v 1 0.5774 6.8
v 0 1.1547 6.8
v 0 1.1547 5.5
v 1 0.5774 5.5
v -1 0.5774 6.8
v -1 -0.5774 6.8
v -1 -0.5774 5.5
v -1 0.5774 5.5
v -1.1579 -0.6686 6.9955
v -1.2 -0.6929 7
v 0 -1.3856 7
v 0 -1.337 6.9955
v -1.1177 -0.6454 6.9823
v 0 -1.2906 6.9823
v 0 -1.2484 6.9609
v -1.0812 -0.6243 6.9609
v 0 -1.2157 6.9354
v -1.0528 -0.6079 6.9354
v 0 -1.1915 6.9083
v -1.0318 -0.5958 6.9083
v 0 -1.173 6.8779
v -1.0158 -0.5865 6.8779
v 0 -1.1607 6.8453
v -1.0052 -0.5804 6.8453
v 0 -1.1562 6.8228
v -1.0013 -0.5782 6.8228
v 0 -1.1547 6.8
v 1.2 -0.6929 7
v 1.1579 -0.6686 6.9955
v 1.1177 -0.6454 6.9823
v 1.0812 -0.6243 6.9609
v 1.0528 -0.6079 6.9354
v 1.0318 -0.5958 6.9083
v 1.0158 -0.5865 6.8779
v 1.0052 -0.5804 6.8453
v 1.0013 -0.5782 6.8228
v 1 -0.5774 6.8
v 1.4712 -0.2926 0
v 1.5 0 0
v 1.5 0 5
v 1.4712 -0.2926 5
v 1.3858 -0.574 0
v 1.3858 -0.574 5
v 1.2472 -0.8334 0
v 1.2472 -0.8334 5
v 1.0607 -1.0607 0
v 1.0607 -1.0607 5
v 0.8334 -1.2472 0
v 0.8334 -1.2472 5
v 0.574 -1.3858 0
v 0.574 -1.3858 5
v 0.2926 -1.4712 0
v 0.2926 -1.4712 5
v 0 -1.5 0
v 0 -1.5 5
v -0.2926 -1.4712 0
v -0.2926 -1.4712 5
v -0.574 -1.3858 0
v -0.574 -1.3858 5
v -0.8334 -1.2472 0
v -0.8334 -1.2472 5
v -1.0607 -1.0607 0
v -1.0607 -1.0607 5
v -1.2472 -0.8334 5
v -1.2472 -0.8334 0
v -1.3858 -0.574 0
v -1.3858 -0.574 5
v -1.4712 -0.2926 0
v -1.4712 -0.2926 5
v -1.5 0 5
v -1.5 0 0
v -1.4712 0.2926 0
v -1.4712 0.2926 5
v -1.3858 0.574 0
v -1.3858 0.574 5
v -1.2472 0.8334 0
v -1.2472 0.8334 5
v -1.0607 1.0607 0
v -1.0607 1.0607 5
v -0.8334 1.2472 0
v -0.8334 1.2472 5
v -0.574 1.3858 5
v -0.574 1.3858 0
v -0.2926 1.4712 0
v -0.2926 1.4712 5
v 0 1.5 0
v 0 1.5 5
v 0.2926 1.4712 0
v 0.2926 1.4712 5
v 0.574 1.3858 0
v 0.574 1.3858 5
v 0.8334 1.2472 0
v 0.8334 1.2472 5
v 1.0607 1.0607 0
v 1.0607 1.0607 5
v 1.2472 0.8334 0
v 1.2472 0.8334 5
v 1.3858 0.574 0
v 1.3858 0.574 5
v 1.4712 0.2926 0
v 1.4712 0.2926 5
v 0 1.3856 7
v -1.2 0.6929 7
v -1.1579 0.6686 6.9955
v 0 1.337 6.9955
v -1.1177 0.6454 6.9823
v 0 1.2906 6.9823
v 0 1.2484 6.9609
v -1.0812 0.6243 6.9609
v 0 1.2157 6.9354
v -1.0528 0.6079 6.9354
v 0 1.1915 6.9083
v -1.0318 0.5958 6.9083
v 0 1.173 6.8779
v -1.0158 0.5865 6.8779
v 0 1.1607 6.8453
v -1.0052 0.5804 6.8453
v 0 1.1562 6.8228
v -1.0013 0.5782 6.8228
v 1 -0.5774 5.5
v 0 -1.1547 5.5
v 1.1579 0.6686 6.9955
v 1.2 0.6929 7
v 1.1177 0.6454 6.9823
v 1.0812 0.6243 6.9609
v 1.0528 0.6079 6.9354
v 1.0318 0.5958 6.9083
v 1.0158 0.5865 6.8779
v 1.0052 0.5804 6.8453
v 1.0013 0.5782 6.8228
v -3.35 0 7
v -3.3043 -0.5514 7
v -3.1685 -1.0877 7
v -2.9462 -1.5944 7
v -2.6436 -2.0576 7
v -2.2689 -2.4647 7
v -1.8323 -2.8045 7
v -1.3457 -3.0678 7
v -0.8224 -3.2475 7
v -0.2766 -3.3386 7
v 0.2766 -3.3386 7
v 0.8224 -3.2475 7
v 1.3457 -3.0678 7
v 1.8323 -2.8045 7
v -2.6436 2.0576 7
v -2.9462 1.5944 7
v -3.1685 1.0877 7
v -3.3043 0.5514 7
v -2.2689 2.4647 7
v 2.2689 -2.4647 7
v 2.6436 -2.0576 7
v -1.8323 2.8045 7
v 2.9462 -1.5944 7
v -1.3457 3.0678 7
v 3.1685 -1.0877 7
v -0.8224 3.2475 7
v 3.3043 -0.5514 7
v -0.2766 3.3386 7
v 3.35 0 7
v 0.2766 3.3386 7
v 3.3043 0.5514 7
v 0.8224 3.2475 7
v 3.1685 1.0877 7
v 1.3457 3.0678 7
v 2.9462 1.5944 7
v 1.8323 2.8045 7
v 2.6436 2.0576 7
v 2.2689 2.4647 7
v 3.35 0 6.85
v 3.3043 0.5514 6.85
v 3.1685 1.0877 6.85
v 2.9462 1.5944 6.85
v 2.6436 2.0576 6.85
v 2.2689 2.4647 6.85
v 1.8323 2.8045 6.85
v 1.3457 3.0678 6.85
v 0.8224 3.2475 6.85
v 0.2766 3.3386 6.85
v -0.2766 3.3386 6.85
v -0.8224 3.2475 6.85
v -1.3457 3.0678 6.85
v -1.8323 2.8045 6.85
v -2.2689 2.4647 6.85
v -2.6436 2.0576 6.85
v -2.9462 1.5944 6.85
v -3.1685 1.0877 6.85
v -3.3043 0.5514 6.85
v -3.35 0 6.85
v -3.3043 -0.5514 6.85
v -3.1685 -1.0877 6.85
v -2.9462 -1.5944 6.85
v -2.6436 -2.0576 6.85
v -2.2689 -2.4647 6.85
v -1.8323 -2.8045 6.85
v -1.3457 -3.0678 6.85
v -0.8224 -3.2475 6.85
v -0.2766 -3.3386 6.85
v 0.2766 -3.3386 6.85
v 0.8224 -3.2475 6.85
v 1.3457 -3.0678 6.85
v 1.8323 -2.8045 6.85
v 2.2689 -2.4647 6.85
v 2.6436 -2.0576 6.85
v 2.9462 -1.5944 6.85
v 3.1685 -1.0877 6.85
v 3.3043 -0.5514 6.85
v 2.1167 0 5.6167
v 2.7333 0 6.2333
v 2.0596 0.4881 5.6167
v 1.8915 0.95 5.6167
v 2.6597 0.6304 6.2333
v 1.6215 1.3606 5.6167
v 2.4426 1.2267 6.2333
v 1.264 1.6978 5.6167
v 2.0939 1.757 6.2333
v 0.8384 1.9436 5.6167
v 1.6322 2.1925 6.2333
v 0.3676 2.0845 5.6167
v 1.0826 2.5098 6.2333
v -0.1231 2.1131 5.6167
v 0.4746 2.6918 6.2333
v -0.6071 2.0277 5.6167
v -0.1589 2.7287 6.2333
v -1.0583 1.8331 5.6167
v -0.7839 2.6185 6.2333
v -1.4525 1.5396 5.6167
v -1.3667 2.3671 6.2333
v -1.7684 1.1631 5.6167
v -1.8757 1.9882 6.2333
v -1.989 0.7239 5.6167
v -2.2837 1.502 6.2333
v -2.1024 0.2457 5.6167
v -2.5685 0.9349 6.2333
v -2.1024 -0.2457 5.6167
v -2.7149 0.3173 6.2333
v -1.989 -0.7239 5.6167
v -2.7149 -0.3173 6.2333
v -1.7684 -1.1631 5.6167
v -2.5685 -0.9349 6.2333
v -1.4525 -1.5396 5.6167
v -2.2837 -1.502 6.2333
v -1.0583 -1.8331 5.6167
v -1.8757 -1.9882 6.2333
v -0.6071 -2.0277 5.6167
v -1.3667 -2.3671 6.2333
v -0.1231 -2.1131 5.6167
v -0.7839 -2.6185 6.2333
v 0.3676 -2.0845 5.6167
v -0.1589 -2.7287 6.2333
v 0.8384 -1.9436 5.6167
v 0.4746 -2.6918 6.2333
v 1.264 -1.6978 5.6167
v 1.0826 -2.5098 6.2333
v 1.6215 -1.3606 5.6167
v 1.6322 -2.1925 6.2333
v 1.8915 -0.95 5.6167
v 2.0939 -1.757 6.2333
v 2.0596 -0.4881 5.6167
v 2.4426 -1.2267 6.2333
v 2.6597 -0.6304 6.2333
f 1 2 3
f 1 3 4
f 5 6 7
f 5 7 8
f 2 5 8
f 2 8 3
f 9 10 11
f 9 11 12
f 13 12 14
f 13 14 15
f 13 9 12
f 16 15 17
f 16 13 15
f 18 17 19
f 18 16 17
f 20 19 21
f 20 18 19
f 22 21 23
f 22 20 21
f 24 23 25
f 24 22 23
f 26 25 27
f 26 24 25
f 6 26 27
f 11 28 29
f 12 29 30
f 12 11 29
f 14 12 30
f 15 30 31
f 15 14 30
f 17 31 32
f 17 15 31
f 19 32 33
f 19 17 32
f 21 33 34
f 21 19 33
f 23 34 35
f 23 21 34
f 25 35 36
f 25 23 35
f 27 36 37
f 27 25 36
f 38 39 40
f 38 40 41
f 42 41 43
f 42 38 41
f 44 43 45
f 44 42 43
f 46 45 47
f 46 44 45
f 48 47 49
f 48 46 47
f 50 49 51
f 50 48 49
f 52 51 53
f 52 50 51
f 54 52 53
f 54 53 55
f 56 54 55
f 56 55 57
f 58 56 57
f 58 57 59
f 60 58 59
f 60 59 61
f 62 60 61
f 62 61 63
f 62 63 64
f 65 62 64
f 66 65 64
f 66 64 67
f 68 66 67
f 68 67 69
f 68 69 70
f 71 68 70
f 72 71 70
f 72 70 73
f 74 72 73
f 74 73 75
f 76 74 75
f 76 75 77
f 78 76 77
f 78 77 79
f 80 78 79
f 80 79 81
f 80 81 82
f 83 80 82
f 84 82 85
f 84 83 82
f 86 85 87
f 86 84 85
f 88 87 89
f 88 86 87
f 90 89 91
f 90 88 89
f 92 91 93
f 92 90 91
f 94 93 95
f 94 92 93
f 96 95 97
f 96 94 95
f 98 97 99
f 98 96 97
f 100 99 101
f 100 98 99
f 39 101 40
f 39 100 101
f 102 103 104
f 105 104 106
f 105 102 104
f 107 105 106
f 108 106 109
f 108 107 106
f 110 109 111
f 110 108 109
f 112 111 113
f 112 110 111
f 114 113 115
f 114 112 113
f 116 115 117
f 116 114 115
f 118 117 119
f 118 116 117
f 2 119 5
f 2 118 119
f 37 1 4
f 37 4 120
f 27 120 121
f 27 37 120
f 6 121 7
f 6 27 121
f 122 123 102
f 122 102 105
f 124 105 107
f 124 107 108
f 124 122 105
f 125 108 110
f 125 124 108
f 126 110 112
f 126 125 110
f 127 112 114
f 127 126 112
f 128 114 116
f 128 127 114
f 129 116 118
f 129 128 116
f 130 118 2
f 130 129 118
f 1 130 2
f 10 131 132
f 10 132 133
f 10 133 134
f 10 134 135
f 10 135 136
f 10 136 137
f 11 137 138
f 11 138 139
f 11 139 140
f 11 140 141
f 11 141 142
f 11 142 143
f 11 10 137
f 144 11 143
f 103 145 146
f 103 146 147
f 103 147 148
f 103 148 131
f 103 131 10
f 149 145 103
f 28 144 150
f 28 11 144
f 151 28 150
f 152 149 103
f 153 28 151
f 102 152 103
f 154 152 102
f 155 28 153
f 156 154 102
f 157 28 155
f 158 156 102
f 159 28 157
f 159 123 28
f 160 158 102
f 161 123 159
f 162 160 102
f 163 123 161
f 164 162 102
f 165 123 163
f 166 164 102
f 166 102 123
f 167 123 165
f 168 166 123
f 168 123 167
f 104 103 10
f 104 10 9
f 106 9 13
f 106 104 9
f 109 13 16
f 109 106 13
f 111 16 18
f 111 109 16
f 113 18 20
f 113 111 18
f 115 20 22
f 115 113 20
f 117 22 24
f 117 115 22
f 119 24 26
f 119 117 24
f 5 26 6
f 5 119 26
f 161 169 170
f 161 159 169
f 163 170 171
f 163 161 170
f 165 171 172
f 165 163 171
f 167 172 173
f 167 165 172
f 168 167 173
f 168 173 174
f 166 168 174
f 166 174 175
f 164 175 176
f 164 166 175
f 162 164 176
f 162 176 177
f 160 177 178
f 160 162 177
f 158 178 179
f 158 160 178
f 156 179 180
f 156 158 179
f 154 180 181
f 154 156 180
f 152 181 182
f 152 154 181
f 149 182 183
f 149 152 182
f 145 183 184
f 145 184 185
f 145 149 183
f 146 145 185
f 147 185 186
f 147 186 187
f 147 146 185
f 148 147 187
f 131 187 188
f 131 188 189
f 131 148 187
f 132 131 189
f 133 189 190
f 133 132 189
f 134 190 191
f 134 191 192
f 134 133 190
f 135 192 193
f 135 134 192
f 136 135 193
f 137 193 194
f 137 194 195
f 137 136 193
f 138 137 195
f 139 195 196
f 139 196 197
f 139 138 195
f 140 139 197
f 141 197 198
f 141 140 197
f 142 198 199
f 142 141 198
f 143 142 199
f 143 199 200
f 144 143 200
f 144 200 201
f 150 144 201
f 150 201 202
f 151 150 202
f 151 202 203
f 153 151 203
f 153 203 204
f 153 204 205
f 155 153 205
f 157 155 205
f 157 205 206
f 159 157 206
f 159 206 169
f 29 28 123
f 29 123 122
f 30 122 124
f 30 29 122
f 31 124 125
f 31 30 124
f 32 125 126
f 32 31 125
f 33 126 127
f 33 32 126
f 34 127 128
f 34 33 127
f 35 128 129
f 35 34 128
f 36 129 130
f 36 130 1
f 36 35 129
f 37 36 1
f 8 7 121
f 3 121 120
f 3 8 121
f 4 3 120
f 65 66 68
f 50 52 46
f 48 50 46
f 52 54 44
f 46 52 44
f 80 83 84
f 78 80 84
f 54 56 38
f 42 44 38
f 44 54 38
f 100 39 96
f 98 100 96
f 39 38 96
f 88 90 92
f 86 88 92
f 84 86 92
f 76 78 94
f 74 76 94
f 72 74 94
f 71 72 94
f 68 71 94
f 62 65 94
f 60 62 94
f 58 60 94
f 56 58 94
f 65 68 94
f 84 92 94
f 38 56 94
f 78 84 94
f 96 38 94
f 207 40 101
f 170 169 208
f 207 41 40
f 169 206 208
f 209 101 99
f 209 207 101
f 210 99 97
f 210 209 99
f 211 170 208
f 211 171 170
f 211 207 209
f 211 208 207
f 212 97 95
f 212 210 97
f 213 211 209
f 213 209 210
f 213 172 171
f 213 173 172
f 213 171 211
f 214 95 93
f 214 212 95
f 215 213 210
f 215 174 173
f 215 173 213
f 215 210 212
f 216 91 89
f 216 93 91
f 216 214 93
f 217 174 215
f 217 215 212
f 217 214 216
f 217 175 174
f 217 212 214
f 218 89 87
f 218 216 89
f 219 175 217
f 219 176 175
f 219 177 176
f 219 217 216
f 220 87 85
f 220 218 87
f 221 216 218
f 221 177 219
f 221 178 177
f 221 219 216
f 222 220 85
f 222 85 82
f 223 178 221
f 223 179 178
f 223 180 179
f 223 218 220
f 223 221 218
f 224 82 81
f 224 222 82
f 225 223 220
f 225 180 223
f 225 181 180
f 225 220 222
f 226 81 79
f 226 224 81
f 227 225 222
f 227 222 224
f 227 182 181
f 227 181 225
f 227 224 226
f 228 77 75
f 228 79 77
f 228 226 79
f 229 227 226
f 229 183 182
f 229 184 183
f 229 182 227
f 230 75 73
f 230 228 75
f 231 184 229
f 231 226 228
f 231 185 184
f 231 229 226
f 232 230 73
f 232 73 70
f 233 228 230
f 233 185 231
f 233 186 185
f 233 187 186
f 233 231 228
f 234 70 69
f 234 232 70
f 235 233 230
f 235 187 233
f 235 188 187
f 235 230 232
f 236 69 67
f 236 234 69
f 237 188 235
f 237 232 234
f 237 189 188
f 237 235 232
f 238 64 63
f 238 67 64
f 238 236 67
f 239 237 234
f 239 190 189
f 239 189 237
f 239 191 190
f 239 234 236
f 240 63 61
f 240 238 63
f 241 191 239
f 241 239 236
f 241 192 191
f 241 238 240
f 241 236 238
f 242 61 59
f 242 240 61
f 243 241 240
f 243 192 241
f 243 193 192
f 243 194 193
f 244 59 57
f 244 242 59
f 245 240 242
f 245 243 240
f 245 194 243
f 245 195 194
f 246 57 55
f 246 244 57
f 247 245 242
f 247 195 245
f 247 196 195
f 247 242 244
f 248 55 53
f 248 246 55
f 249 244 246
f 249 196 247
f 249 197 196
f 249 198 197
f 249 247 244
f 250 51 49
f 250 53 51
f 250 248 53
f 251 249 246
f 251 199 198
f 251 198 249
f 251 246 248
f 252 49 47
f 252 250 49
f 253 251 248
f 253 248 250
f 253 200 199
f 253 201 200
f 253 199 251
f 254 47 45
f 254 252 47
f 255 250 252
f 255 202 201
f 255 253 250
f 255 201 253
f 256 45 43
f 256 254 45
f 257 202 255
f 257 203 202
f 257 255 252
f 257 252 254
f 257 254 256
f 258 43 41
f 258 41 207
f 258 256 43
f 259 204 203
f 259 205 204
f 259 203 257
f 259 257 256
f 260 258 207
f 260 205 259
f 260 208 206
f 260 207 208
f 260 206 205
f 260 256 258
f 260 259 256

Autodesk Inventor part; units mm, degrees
ref_plane "YZ Plane" through (0, 0, 0) normal (1, 0, 0) x (0, 1, 0)
ref_plane "XZ Plane" through (0, 0, 0) normal (0, 1, 0) x (-1, 0, 0)
ref_plane "XY Plane" through (0, 0, 0) normal (0, 0, 1) x (1, 0, 0)
sketch "Sketch1" plane through (0, 0, 0) normal (0, 0, 1) x (1, 0, 0)
  circle A0 centre (0, 0) radius 1.5
  dimension "d0" = 3
extrude "Extrusion1" add sketch "Sketch1" along normal blind 5
sketch "Sketch2" plane through (0, 0, 5) normal (0, 0, 1) x (1, 0, 0)
  circle A0 centre (0, 0) radius 1.5 projected
extrude "Extrusion2" add sketch "Sketch2" along normal blind 2 draft 45
sketch "Sketch3" plane through (0, 0, 7) normal (0, 0, 1) x (1, 0, 0)
  circle A0 centre (0, 0) radius 3.5 projected
  circle A1 centre (0, 0) radius 3.35
  dimension "d5" = 6.7
extrude "Extrusion3" cut sketch "Sketch3" against normal blind 2
thread "Thread1" size "M3x0.5" class "6g" standard "ANSI Metric M Profile" full length
sketch "Sketch4" plane through (0, 0, 7) normal (0, 0, 1) x (1, 0, 0)
  circle A0 centre (0, 0) radius 3.35 projected
  line L0 (0, -1.1547) -> (-1, -0.5774)
  line L1 (-1, -0.5774) -> (-1, 0.5774)
  line L2 (-1, 0.5774) -> (0, 1.1547)
  line L3 (0, 1.1547) -> (1, 0.5774)
  line L4 (1, 0.5774) -> (1, -0.5774)
  line L5 (1, -0.5774) -> (0, -1.1547)
  dimension "d10" = 1
extrude "Extrusion4" cut sketch "Sketch4" against normal blind 1.5 contours L0 L1 L2 L3 L4 L5
fillet "Fillet1" radius 0.2 6 edges at (-0.5, 0.866, 7) (-1, 0, 7) (-0.5, -0.866, 7) (0.5, -0.866, 7) (1, 0, 7) (0.5, 0.866, 7)
properties part number "bed m3 bolt" material "Stainless Steel"
